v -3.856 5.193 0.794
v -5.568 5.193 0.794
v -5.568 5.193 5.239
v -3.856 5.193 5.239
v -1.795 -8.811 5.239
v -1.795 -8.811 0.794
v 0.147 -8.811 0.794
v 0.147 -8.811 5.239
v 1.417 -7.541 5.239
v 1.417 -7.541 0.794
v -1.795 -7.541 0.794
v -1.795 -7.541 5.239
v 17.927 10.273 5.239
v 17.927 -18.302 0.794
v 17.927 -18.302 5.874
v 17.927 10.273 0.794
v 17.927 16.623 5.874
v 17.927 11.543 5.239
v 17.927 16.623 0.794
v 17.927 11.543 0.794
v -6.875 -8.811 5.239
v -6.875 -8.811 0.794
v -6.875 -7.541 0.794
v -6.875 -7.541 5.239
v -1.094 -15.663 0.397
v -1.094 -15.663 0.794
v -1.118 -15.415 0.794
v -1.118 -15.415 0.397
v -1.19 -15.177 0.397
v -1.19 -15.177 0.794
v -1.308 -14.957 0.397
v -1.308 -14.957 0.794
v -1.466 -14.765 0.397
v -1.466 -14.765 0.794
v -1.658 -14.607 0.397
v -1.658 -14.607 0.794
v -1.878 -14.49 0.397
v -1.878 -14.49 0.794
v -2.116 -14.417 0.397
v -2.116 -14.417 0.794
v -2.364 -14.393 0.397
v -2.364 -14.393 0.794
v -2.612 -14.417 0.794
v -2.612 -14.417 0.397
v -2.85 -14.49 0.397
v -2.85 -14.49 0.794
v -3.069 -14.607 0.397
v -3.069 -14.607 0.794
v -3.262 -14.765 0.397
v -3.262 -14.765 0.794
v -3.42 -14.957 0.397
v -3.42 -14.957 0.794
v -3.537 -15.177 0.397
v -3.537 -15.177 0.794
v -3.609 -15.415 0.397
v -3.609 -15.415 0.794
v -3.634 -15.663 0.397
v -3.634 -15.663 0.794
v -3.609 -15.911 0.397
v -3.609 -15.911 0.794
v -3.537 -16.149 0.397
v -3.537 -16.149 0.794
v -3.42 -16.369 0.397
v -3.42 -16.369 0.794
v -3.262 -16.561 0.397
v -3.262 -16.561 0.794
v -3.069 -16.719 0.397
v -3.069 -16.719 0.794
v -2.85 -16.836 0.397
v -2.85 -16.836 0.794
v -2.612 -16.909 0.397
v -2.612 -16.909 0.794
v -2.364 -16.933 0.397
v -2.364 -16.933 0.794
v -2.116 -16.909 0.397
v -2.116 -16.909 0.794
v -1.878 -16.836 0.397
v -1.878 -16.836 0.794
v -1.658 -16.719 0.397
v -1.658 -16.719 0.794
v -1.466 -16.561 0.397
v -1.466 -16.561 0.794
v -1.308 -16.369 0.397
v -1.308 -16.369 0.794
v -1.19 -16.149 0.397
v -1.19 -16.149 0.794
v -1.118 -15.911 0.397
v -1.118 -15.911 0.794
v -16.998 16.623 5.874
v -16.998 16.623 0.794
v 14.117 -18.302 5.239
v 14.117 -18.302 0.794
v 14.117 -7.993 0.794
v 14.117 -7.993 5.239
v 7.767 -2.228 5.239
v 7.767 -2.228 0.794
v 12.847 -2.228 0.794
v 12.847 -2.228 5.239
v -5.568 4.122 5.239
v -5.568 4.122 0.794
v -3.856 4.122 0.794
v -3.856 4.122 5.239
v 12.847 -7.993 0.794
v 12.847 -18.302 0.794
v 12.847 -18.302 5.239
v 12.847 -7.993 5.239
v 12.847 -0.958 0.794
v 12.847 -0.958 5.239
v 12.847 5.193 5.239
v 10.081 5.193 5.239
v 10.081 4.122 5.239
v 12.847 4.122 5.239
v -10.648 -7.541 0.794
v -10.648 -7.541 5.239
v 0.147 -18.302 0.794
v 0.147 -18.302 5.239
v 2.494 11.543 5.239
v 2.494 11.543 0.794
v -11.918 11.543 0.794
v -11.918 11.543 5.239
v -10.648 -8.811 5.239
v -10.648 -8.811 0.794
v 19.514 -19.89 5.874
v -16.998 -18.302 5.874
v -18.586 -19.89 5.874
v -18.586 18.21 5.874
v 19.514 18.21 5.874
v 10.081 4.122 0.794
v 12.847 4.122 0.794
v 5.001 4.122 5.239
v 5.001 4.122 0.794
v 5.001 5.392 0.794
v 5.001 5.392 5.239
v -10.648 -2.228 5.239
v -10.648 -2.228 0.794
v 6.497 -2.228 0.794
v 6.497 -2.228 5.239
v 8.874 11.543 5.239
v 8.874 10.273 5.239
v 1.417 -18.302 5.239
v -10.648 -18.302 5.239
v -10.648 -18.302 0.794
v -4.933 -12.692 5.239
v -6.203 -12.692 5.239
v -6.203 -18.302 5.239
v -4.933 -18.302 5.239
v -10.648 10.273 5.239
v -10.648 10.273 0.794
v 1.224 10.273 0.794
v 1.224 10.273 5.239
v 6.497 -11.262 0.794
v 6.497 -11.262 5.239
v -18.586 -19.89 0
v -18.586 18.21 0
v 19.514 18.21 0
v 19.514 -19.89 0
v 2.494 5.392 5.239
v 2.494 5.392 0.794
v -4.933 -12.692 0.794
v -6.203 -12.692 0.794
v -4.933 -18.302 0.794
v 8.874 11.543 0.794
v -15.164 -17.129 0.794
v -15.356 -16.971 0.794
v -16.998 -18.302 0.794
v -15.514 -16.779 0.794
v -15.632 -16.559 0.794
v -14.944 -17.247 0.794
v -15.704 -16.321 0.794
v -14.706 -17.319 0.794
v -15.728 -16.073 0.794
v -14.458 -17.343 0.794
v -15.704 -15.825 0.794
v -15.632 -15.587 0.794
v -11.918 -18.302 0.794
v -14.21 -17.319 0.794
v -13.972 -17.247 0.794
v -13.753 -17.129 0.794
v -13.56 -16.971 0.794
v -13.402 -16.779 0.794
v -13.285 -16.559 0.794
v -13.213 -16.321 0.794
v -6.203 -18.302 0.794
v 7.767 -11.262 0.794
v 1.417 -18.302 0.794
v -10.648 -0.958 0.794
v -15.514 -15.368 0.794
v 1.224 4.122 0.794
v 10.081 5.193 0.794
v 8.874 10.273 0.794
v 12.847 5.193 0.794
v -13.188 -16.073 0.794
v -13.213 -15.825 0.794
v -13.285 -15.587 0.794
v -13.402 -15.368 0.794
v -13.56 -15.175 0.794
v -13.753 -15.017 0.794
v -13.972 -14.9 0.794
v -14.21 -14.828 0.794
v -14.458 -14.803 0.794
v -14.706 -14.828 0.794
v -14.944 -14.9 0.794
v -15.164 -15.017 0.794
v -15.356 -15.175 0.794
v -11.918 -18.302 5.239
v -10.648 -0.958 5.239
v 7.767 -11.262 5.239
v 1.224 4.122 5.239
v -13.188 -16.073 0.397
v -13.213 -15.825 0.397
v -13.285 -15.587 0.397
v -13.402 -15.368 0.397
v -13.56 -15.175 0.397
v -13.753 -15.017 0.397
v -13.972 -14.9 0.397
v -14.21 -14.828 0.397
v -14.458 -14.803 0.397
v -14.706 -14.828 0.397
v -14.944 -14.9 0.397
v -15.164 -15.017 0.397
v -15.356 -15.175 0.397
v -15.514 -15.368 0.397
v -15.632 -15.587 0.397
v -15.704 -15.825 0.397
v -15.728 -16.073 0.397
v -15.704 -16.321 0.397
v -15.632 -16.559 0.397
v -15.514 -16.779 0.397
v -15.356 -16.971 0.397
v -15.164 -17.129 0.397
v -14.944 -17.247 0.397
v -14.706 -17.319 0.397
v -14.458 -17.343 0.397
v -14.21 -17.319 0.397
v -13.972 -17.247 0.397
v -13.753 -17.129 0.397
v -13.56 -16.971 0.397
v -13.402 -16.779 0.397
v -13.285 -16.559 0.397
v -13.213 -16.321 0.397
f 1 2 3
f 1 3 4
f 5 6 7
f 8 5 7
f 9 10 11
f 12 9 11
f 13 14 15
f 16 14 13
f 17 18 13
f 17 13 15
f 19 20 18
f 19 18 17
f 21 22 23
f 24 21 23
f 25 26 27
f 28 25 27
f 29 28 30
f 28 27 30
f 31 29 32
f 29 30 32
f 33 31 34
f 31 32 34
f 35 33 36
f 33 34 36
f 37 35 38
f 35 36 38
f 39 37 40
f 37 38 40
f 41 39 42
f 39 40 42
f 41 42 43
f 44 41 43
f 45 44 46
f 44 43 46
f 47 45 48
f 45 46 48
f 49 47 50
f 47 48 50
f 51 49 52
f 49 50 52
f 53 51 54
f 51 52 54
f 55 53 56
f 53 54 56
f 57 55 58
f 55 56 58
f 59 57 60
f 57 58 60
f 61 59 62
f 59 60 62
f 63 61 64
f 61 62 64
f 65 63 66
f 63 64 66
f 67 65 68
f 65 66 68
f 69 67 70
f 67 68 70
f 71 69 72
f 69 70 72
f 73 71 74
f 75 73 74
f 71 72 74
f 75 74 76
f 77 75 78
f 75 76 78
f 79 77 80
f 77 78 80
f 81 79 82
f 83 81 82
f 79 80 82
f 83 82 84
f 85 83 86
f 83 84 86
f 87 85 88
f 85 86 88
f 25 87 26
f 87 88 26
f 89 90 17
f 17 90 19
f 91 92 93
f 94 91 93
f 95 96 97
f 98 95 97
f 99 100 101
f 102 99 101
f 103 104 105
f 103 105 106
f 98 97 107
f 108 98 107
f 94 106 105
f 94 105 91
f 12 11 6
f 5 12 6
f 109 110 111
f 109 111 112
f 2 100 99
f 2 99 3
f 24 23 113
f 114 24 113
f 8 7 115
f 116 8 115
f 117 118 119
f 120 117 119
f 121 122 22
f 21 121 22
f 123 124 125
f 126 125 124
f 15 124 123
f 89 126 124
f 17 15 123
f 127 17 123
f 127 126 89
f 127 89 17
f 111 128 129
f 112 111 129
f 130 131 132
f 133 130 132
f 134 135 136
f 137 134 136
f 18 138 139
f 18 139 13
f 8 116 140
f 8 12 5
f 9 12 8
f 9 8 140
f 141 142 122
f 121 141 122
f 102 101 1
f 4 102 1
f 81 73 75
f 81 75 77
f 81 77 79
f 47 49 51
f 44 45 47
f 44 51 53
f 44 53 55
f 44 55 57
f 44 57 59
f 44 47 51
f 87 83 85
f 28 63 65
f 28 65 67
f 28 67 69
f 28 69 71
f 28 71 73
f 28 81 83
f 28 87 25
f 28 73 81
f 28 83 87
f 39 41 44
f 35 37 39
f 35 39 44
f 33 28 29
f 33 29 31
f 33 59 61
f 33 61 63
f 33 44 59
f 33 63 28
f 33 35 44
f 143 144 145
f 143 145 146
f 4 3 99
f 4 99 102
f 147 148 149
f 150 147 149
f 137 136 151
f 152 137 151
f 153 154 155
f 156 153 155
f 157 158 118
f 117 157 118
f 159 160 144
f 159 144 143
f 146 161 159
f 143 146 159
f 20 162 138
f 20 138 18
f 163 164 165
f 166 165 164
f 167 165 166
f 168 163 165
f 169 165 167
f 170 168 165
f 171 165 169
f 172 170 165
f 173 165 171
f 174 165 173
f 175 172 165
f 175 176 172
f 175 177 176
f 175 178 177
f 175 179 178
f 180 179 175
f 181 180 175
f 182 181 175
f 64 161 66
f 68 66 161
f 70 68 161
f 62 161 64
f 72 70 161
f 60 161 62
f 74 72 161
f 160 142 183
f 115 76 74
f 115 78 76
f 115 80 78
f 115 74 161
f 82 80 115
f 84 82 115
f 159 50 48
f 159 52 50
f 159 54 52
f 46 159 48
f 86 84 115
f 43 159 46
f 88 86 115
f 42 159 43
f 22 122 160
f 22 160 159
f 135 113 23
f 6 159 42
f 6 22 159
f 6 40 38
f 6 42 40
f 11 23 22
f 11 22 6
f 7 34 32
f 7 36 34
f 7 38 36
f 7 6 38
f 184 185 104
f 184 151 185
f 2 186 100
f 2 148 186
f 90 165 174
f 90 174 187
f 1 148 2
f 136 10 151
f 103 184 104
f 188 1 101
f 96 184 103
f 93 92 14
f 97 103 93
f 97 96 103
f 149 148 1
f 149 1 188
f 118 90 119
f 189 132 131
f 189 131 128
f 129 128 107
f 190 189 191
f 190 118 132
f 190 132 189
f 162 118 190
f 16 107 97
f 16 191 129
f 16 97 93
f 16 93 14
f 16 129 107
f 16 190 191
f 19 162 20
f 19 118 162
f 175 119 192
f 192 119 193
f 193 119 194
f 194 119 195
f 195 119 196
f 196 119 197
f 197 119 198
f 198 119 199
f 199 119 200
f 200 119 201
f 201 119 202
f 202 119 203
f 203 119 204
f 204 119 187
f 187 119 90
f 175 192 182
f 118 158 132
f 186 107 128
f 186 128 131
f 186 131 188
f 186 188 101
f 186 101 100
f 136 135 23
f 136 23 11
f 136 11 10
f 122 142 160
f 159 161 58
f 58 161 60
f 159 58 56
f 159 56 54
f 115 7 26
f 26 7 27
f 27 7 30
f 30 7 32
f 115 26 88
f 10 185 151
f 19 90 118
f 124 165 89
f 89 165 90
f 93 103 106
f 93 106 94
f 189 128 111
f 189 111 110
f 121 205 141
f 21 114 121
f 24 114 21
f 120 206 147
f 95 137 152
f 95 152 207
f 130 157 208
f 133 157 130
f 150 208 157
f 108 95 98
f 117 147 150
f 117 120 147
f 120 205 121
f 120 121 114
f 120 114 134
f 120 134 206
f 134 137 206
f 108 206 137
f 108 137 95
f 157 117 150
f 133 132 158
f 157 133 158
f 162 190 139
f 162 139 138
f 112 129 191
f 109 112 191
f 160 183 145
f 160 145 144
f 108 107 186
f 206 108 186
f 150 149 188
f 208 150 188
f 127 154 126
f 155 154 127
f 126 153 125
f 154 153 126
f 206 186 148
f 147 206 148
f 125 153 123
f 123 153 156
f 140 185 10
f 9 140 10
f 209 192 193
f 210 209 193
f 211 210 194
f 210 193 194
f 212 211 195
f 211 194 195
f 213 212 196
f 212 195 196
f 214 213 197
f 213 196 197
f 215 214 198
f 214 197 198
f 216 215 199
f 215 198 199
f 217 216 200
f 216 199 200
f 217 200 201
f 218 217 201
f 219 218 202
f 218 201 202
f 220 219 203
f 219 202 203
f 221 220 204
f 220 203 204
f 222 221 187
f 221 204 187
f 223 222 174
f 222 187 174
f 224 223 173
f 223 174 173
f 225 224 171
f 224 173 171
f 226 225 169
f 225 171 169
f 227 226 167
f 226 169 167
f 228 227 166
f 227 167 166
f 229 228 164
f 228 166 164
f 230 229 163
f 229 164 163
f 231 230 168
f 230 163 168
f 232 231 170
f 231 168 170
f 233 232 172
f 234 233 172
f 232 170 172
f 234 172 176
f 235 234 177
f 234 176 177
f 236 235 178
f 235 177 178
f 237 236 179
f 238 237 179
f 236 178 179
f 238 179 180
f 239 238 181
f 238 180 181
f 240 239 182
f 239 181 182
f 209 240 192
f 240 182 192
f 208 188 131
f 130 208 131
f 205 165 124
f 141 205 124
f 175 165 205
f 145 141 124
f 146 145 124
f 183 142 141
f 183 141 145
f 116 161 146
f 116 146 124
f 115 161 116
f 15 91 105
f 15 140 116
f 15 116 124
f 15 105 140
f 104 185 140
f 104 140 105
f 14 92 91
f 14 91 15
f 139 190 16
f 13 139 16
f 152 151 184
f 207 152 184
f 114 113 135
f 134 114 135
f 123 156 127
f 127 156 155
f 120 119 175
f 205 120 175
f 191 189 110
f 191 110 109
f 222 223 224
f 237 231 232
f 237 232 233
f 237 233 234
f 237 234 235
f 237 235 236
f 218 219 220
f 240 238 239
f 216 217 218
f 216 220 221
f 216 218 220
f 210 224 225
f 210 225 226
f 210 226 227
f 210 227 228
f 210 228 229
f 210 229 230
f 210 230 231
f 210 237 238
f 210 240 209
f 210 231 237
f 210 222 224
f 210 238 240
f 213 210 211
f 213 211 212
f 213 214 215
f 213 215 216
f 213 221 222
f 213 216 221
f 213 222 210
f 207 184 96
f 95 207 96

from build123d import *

# Parameters (mm, degrees)
F0_W     = 38.1
F0_H     = 38.1
F1_DEPTH = 0.79375
F2_W     = 38.1
F2_H     = 38.1
F2_W_2   = 34.925
F2_H_2   = 34.925
F3_DEPTH = 5.08
F4_W     = 9.0528408943
F4_H     = 1.27
F5_DEPTH = 4.445
F4_W_2   = 1.27
F4_H_2   = 10.3092815826
F4_R     = 1.27
F4_W_3   = 2.7661539333
F4_H_3   = 1.0710589232
F4_H_4   = 5.6106120447
F4_W_4   = 1.712341144
F6_DEPTH = 4.445
F7_DEPTH = 4.445
F8_DEPTH = 0.396875


with BuildPart() as f1:
    # F0 (on Top) → F1 (new body)
    with BuildSketch(Plane.XY):
        with Locations((0.4642736167, -0.8399097333)):
            Rectangle(F0_W, F0_H)
    extrude(amount=F1_DEPTH)

    # F2 (on face) → F3 (join)
    with BuildSketch(Plane.XY.offset(0.79375)):
        with Locations((0.4642736167, -0.8399097333)):
            Rectangle(F2_W, F2_H)
        with Locations((0.4642736167, -0.8399097333)):
            Rectangle(F2_W_2, F2_H_2, mode=Mode.SUBTRACT)
    extrude(amount=F3_DEPTH)

    # F4 (on face) → F5 (join)
    with BuildSketch(Plane.XY.offset(0.79375)):
        Polygon((-11.9182263833, 11.5425902667), (-11.9182263833, -18.3024097333), (-10.6482263833, -18.3024097333), (-10.6482263833, -8.8111795485), (-6.8751736544, -8.8111795485), (-6.8751736544, -7.5411795485), (-10.6482263833, -7.5411795485), (-10.6482263833, -2.2284686565), (6.4967736167, -2.2284686565), (6.4967736167, -11.2619977444), (7.7667736167, -11.2619977444), (7.7667736167, -2.2284686565), (12.8467736167, -2.2284686565), (12.8467736167, -0.9584686565), (-10.6482263833, -0.9584686565), (-10.6482263833, 10.2725902667), (1.2241147607, 10.2725902667), (1.2241147607, 4.1215313435), (2.4941147607, 4.1215313435), (5.0006196834, 4.1215313435), (5.0006196834, 5.3915313435), (2.4941147607, 5.3915313435), (2.4941147607, 10.2725902667), (2.4941147607, 11.5425902667), (-10.6482263833, 11.5425902667), align=None)
        with Locations((13.4003531695, 10.9075902667)):
            Rectangle(F4_W, F4_H)
    extrude(amount=F5_DEPTH)

    # F4 (on face) → F6 (join)
    with BuildSketch(Plane.XY.offset(0.79375)):
        Polygon((-11.9182263833, 11.5425902667), (-11.9182263833, -18.3024097333), (-10.6482263833, -18.3024097333), (-10.6482263833, -8.8111795485), (-6.8751736544, -8.8111795485), (-6.8751736544, -7.5411795485), (-10.6482263833, -7.5411795485), (-10.6482263833, -2.2284686565), (6.4967736167, -2.2284686565), (6.4967736167, -11.2619977444), (7.7667736167, -11.2619977444), (7.7667736167, -2.2284686565), (12.8467736167, -2.2284686565), (12.8467736167, -0.9584686565), (-10.6482263833, -0.9584686565), (-10.6482263833, 10.2725902667), (1.2241147607, 10.2725902667), (1.2241147607, 4.1215313435), (2.4941147607, 4.1215313435), (5.0006196834, 4.1215313435), (5.0006196834, 5.3915313435), (2.4941147607, 5.3915313435), (2.4941147607, 10.2725902667), (2.4941147607, 11.5425902667), (-10.6482263833, 11.5425902667), align=None)
        with Locations((13.4003531695, 10.9075902667)):
            Rectangle(F4_W, F4_H)
        with Locations((13.4817736167, -13.147768942)):
            Rectangle(F4_W_2, F4_H_2)
        with Locations((-14.4582263833, -16.0732418299)):
            Circle(F4_R)
        with Locations((11.46369665, 4.6570608051)):
            Rectangle(F4_W_3, F4_H_3)
        with Locations((-5.5682263833, -15.497103711)):
            Rectangle(F4_W_2, F4_H_4)
        Polygon((0.1467736167, -18.3024097333), (1.4167736167, -18.3024097333), (1.4167736167, -7.5411795485), (0.1467736167, -7.5411795485), (-1.7951736544, -7.5411795485), (-1.7951736544, -8.8111795485), (0.1467736167, -8.8111795485), align=None)
        with Locations((-4.7120558113, 4.6570608051)):
            Rectangle(F4_W_4, F4_H_3)
        with Locations((-2.3637847044, -15.662971884)):
            Circle(F4_R)
    extrude(amount=F6_DEPTH)

    # F7 (cut): faces of the model
    f7_faces = [f1.faces().sort_by_distance(p)[0] for p in [
        (-14.4582263833, -16.0732418299, 5.23875),
        (-2.3637847044, -15.662971884, 5.23875),
    ]]
    extrude(f7_faces, amount=-F7_DEPTH, mode=Mode.SUBTRACT)

    # F4 (on face) → F8 (cut)
    with BuildSketch(Plane.XY.offset(0.79375)):
        with Locations((-14.4582263833, -16.0732418299)):
            Circle(F4_R)
        with Locations((-2.3637847044, -15.662971884)):
            Circle(F4_R)
    extrude(amount=-F8_DEPTH, mode=Mode.SUBTRACT)


solid = f1.part
